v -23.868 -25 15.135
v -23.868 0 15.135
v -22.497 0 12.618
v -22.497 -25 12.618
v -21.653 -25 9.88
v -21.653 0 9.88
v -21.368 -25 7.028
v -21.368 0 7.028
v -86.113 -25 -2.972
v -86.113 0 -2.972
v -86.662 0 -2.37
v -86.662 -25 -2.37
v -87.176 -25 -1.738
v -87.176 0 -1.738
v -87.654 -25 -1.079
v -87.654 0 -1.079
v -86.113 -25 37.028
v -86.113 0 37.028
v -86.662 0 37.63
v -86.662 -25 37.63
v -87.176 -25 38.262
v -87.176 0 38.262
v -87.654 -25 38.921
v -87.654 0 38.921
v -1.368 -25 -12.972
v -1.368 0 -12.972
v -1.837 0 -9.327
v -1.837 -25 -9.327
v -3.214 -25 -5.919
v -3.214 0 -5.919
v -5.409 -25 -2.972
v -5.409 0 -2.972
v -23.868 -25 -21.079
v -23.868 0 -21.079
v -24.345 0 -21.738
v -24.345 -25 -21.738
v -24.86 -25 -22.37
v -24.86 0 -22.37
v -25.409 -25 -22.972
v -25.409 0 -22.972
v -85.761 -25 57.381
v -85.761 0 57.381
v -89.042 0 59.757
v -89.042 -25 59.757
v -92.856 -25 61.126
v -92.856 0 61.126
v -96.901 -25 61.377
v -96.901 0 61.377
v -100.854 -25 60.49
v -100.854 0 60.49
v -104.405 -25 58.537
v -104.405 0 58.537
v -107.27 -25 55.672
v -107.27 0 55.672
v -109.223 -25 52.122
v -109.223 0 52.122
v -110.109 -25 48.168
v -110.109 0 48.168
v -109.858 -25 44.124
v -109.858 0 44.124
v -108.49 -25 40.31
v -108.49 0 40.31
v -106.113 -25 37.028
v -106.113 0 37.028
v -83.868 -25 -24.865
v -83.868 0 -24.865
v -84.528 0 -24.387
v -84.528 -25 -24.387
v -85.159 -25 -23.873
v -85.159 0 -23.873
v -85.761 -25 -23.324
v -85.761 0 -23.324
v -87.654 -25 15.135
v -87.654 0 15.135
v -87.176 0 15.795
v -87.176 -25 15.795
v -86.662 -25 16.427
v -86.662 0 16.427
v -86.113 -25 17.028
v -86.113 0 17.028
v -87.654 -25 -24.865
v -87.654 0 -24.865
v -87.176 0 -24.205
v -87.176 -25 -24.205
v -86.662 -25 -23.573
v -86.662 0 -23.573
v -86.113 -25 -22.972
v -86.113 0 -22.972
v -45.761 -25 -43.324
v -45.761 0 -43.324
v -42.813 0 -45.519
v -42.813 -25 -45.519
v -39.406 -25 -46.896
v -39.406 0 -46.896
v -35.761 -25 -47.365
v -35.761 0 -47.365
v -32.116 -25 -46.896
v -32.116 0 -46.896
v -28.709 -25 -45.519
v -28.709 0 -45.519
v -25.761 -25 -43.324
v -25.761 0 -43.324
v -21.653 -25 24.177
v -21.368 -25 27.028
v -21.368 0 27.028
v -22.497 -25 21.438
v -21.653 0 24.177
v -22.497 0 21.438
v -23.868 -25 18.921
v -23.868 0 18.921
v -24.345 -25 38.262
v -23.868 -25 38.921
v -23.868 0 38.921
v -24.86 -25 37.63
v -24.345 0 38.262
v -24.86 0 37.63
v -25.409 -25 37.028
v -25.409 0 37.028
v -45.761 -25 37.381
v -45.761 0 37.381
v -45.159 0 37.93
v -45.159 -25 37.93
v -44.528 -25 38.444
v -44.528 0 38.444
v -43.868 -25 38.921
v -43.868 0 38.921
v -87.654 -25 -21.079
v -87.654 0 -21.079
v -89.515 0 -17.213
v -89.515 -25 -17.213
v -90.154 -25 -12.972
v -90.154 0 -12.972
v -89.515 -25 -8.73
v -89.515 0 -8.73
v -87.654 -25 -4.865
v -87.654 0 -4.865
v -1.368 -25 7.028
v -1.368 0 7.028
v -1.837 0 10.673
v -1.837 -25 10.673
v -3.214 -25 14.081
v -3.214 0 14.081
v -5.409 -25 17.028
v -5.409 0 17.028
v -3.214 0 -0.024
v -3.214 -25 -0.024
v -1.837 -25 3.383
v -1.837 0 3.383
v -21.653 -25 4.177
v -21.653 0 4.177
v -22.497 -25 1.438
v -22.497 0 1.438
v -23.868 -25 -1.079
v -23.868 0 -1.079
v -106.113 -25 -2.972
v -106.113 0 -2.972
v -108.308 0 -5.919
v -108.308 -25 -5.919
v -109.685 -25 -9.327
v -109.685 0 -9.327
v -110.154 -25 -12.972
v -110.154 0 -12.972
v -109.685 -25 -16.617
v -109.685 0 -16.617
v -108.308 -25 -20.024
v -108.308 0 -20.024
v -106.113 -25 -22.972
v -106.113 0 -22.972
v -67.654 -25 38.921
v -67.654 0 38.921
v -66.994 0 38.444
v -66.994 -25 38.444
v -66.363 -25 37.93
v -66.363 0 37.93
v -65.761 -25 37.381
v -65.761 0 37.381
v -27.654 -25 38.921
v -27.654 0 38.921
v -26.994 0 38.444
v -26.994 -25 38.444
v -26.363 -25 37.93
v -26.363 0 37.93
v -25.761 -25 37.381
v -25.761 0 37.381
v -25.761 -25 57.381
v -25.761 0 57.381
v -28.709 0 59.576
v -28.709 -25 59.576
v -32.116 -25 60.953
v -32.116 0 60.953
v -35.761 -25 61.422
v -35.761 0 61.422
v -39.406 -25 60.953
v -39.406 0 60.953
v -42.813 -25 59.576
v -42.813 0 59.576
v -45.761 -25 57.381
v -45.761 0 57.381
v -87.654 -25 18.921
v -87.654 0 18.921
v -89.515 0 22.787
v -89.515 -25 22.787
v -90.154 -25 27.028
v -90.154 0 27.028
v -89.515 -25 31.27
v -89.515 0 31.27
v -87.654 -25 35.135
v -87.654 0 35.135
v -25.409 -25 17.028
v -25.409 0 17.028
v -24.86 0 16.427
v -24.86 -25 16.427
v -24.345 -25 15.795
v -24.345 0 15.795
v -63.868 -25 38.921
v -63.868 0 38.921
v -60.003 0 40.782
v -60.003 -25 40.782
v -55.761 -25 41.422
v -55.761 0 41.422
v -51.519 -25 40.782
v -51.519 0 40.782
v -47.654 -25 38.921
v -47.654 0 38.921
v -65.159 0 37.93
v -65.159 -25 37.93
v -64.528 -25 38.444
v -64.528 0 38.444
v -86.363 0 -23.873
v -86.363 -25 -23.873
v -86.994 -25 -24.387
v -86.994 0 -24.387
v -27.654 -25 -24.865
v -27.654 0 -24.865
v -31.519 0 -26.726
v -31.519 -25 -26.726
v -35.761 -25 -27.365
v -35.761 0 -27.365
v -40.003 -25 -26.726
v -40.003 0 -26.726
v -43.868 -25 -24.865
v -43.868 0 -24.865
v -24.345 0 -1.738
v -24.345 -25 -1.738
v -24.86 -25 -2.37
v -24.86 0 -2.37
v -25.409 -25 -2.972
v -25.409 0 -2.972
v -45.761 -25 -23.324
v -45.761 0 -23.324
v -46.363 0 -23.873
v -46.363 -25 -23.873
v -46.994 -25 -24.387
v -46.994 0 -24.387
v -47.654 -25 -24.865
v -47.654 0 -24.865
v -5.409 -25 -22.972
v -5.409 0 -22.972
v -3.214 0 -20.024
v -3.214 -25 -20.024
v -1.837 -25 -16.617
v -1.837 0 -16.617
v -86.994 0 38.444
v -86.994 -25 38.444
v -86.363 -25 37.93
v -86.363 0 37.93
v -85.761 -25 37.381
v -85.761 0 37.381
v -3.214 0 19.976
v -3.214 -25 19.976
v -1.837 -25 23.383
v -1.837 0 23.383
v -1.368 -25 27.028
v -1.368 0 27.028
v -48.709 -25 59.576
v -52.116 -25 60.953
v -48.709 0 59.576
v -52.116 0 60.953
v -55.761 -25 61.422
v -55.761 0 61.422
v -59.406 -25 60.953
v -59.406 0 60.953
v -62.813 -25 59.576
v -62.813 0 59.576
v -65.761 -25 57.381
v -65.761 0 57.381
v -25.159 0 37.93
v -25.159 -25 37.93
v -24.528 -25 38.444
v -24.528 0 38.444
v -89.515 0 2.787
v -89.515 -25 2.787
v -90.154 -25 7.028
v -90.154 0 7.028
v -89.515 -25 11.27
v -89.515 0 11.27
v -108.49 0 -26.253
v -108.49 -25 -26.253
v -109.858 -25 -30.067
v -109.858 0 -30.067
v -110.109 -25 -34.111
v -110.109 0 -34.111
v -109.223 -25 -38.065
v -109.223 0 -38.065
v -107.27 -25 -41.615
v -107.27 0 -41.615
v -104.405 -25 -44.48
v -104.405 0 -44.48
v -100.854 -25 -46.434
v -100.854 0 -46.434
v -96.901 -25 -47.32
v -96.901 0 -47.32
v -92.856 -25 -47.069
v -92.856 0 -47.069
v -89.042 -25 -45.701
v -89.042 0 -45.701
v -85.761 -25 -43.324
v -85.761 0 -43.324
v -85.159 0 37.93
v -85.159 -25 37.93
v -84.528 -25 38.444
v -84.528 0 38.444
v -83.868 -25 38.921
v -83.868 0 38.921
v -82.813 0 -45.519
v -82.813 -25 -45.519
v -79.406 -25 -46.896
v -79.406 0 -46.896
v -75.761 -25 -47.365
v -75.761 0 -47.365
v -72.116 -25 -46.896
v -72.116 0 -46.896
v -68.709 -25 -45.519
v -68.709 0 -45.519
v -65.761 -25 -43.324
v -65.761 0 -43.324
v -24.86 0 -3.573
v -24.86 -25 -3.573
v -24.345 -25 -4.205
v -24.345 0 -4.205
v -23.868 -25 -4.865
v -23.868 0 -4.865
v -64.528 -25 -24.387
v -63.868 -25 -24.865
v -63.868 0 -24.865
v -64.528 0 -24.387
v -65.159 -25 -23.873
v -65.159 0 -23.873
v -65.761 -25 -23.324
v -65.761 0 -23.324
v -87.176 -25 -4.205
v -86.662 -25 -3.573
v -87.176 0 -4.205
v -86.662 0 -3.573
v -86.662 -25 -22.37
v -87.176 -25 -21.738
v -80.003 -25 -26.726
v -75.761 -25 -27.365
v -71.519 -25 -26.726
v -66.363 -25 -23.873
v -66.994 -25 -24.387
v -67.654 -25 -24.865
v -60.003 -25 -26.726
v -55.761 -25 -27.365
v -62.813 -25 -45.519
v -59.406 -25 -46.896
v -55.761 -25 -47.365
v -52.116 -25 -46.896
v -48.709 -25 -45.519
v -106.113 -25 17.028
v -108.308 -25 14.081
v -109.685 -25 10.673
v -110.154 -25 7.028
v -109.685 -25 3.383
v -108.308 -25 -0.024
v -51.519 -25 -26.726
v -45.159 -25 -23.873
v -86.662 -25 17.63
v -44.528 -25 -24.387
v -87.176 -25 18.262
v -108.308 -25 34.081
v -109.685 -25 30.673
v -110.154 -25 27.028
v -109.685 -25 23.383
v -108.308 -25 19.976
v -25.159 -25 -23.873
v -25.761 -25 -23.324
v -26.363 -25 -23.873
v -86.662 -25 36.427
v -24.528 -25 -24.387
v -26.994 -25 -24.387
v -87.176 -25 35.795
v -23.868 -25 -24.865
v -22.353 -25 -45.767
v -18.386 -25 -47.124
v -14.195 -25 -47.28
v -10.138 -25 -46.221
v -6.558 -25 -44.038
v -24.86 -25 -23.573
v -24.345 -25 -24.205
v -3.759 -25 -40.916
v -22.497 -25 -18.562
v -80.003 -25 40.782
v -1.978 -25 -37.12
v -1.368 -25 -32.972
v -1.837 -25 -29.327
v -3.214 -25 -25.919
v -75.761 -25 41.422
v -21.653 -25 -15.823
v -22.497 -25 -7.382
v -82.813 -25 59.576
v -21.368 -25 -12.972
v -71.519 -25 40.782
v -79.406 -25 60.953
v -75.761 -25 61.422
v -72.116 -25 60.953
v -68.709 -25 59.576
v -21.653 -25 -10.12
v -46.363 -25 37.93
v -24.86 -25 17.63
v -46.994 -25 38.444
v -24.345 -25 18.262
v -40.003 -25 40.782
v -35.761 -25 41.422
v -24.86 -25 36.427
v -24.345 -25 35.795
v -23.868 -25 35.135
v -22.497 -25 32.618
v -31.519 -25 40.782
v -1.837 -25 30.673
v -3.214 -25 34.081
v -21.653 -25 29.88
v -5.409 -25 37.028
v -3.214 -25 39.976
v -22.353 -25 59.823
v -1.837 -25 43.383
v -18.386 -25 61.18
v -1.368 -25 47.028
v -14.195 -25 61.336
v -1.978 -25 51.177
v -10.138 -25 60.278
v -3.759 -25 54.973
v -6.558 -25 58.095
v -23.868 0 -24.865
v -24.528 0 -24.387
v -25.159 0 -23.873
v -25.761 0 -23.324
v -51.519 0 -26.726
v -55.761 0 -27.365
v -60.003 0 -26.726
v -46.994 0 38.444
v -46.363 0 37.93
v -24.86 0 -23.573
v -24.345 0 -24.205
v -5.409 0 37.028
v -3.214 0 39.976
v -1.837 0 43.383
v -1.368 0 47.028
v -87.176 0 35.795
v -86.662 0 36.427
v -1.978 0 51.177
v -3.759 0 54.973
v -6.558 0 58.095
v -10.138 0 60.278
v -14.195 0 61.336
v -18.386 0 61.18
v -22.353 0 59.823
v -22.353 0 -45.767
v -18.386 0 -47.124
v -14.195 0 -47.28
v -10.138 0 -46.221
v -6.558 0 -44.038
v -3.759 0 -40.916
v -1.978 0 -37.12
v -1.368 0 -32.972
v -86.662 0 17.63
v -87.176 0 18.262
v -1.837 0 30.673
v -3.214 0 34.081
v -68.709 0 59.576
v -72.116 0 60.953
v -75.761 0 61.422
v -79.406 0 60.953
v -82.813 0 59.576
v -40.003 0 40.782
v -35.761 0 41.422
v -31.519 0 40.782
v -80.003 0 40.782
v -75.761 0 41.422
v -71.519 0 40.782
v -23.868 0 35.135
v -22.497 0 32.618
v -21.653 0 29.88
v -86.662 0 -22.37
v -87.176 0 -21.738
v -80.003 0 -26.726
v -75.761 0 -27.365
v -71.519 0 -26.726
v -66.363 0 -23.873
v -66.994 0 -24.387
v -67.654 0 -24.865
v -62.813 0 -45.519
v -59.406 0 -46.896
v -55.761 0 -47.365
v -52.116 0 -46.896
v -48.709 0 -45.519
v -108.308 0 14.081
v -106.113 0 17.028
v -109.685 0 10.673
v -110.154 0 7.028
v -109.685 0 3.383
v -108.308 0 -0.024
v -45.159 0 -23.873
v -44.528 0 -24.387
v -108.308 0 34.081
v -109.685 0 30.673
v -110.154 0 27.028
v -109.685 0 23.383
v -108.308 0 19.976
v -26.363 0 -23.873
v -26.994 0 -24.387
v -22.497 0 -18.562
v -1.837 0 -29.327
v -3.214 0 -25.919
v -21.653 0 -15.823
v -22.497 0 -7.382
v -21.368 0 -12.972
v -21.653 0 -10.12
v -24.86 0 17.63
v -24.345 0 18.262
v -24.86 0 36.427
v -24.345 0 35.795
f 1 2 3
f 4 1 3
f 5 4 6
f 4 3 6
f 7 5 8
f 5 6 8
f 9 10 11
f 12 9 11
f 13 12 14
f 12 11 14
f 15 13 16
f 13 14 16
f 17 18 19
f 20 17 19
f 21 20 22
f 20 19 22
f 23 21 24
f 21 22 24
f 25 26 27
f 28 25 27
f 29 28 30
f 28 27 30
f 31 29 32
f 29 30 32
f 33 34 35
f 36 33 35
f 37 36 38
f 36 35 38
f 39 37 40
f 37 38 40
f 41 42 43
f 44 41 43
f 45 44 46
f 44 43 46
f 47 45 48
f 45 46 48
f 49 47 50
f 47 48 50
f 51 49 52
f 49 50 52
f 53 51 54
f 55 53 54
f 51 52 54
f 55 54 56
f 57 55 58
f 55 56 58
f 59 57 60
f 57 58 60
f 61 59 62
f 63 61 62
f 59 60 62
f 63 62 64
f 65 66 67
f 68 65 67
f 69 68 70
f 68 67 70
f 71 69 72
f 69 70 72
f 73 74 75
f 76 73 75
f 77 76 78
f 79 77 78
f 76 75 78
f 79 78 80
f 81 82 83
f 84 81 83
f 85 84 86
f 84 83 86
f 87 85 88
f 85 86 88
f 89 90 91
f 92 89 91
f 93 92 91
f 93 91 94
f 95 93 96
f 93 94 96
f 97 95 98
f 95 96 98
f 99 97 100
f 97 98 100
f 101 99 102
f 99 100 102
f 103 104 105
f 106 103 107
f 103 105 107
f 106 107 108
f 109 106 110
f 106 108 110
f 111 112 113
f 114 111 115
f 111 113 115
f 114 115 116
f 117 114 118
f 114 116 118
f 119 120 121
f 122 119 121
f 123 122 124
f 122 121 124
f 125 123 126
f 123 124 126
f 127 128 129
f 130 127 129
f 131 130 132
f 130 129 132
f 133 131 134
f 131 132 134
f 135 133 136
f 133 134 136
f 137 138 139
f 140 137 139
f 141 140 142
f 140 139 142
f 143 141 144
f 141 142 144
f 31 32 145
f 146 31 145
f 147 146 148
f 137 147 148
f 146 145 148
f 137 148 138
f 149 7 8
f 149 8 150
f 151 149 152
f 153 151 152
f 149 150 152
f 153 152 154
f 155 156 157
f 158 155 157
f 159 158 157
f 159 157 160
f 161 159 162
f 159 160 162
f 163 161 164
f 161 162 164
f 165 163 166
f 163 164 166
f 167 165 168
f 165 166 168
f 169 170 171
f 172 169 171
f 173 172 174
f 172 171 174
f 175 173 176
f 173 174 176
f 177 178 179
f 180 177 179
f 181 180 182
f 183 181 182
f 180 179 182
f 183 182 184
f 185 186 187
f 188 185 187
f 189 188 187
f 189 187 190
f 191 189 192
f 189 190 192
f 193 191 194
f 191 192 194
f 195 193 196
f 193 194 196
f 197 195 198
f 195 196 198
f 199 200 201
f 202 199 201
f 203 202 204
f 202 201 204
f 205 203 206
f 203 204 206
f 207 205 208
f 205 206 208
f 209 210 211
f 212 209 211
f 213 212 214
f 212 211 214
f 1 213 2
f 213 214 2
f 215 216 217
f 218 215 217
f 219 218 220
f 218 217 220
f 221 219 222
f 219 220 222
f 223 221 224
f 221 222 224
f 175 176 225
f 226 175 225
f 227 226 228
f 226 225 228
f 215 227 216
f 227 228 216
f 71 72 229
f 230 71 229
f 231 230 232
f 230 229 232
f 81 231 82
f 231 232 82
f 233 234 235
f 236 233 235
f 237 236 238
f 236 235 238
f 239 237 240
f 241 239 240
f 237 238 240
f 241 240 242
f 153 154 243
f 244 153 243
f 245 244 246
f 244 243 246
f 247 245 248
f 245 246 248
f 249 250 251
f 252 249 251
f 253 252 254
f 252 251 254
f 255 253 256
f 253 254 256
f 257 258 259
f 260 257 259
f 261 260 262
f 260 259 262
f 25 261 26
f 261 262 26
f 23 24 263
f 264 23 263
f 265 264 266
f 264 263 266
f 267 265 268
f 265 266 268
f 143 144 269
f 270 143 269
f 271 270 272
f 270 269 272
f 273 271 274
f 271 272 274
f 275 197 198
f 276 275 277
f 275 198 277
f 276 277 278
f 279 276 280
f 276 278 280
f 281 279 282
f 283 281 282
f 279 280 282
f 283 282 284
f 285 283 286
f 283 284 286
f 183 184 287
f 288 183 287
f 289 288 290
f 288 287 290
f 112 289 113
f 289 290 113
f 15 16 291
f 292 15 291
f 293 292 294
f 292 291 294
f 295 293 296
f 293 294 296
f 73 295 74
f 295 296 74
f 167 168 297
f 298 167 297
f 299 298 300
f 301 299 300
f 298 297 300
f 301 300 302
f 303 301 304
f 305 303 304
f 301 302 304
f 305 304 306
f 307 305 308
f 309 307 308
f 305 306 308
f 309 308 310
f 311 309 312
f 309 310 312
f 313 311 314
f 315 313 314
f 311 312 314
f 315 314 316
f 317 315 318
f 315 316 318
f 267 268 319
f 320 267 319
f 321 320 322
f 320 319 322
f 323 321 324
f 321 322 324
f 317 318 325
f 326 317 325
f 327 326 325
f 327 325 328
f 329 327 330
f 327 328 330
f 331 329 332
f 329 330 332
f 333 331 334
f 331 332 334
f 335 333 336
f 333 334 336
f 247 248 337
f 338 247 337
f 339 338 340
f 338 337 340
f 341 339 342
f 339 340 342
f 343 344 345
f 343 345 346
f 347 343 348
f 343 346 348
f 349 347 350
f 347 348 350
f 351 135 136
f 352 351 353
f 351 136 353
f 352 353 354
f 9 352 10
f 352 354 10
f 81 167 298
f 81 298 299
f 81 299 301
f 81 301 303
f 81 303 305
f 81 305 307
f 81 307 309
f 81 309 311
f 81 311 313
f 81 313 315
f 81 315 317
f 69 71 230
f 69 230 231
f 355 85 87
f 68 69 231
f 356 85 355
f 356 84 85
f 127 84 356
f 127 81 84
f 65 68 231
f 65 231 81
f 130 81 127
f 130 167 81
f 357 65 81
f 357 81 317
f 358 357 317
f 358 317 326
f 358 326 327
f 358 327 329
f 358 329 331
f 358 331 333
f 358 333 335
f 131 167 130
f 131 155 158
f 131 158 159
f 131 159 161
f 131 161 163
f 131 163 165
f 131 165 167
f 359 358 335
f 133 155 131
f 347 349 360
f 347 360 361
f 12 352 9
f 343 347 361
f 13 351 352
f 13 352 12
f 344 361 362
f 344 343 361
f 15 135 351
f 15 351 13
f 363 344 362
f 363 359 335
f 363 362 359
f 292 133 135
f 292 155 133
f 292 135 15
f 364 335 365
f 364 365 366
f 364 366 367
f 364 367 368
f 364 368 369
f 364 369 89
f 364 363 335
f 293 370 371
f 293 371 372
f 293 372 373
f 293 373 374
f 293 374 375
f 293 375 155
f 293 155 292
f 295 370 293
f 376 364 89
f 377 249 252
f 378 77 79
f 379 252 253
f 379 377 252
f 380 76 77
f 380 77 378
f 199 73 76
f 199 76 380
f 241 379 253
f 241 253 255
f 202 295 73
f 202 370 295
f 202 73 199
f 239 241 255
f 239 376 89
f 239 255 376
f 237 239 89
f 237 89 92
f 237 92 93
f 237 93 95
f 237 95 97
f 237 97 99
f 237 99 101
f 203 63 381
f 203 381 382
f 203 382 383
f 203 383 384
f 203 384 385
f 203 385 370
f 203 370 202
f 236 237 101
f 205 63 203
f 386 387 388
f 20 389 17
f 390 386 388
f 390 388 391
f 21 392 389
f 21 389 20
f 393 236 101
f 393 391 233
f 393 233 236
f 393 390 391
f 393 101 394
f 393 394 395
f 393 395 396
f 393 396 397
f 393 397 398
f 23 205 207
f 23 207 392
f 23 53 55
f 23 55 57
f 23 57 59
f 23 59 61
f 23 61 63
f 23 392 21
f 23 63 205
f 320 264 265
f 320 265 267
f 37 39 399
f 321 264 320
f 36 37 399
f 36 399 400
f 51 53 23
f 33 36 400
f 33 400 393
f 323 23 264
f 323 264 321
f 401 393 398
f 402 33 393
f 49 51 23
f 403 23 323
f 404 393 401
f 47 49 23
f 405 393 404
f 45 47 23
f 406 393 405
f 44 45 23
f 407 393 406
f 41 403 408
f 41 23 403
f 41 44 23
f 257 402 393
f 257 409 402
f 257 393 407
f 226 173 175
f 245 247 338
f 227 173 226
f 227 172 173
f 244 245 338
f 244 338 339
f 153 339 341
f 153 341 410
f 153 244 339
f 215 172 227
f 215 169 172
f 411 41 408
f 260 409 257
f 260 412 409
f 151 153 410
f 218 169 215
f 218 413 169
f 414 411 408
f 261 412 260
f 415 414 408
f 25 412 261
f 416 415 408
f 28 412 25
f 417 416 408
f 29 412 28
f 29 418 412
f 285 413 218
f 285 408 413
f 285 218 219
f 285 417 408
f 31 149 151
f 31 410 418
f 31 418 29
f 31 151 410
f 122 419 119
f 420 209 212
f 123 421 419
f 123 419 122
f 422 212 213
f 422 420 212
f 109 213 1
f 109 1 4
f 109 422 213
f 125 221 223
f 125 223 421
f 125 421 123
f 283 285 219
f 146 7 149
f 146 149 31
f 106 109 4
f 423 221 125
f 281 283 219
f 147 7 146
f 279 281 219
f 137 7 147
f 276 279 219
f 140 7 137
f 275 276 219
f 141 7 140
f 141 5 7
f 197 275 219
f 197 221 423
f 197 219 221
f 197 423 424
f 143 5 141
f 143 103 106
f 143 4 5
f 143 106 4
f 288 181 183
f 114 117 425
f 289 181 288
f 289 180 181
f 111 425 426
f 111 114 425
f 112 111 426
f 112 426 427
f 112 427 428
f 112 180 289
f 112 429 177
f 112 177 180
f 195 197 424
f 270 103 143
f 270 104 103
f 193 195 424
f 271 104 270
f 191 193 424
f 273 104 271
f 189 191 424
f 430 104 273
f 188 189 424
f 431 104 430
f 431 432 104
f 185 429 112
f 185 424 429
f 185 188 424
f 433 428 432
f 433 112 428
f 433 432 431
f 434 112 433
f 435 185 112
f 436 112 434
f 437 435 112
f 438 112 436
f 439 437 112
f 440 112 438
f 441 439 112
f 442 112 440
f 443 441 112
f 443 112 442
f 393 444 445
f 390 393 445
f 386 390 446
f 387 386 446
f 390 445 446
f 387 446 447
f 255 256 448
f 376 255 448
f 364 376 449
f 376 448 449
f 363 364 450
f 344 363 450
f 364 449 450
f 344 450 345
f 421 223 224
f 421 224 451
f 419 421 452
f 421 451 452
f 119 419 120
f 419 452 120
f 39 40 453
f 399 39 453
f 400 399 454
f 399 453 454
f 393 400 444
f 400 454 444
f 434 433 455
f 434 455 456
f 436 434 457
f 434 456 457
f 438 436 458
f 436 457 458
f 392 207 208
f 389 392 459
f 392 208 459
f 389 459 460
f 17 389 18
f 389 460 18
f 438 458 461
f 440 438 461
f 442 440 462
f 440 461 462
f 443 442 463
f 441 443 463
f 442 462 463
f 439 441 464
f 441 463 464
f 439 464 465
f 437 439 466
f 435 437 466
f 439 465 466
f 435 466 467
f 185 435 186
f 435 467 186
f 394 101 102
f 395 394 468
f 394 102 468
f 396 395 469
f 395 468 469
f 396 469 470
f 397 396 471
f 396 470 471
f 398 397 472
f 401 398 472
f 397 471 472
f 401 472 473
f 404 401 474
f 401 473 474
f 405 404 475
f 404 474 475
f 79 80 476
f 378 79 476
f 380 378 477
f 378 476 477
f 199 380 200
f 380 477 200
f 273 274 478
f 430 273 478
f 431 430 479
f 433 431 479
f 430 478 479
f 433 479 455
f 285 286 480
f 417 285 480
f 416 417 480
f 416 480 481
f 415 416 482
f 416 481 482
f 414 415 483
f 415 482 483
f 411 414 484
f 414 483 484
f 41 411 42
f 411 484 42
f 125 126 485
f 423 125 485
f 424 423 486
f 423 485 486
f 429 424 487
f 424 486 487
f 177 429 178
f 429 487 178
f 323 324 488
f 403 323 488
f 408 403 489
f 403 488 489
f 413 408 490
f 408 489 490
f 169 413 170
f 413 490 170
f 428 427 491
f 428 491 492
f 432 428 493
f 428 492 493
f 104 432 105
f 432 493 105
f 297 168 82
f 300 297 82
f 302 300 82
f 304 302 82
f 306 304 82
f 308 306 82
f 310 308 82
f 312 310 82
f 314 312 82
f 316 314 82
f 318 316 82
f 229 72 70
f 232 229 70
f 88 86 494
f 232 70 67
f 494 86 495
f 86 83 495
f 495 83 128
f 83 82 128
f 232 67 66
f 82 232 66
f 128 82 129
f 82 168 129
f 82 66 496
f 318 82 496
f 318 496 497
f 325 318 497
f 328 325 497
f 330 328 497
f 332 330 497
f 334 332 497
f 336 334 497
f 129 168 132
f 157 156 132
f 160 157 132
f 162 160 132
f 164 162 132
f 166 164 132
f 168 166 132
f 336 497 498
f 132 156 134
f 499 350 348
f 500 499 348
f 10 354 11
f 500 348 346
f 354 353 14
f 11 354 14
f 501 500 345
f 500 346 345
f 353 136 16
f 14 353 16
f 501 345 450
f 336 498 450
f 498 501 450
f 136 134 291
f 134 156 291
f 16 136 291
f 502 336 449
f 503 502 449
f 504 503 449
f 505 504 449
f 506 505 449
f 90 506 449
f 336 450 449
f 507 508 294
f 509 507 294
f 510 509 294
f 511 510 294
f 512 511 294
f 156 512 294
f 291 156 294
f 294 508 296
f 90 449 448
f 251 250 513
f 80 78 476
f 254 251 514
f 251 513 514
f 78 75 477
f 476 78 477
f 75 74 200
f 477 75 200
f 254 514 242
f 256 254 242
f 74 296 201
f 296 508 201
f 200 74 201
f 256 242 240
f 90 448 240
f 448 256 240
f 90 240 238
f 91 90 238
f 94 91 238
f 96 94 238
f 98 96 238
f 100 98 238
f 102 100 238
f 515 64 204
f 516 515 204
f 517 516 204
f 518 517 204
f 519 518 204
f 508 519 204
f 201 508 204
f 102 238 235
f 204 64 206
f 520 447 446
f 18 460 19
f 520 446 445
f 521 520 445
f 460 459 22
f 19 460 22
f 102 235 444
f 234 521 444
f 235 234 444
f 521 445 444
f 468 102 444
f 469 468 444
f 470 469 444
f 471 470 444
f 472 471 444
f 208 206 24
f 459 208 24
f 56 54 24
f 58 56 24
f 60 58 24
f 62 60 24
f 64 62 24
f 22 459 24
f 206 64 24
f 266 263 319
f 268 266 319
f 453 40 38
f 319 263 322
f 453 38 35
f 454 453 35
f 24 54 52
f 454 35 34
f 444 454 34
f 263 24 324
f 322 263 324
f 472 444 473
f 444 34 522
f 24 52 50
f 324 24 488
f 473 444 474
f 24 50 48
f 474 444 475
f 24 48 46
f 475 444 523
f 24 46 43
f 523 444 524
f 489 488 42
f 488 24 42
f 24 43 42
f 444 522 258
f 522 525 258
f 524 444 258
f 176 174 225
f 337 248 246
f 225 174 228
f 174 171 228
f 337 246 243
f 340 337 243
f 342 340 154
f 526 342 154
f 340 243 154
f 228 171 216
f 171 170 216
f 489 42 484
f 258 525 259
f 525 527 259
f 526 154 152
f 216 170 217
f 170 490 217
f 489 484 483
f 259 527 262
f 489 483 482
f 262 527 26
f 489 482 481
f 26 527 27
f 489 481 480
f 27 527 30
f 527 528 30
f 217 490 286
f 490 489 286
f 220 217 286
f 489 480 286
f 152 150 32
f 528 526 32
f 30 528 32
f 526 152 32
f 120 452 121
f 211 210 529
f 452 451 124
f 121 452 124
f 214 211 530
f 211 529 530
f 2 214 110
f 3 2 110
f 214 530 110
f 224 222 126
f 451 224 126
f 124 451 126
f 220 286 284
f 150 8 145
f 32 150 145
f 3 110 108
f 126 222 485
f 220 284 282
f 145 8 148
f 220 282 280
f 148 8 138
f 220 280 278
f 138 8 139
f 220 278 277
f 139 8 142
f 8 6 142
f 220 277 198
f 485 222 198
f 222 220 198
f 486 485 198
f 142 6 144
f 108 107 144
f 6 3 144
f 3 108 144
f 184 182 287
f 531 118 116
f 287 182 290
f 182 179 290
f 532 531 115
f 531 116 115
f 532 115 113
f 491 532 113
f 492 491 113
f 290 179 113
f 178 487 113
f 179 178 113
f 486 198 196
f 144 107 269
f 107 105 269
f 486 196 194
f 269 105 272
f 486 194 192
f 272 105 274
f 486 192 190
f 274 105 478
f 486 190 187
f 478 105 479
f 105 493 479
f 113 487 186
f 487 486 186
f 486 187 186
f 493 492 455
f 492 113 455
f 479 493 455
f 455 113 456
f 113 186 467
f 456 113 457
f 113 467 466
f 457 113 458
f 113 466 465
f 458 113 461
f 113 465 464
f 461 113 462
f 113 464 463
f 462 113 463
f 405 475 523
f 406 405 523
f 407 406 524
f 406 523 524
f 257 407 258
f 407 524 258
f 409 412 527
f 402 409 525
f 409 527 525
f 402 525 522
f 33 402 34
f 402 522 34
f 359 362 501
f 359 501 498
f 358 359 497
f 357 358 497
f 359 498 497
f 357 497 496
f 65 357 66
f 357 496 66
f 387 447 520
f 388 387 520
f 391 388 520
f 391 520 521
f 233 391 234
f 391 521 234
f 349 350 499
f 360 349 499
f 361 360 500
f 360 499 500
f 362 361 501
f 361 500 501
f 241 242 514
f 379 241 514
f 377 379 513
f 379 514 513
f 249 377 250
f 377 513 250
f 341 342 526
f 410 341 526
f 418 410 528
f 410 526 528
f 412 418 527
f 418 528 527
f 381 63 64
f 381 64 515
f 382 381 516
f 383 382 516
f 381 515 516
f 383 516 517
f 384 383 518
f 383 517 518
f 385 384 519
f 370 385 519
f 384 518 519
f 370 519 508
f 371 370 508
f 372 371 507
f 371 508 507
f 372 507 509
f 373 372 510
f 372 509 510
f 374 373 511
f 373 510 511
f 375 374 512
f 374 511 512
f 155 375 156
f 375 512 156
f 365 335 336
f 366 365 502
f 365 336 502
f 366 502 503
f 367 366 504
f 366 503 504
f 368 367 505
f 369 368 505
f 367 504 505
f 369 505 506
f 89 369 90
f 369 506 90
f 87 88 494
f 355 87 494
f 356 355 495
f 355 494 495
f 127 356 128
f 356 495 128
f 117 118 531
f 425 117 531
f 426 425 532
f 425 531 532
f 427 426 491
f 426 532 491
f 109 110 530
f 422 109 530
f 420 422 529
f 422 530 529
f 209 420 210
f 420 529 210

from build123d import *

# Parameters (mm, degrees)
F1_DEPTH = 25


with BuildPart() as f1:
    # F0 (on Front) → F1 (new body)
    with BuildSketch(Plane.XZ):
        with BuildLine():
            ThreePointArc((-85.7609340549, -43.3237808544), (-82.5113908499, -38.594520506), (-81.3676158684, -32.9716019332))
            ThreePointArc((-81.3676158684, -32.9716019332), (-82.0068675294, -28.7297553509), (-83.8678402358, -24.8646957523))
            ThreePointArc((-83.8678402358, -24.8646957523), (-84.8471113337, -24.1344416649), (-85.7609340549, -23.3237808544))
            ThreePointArc((-85.7609340549, -23.3237808544), (-86.674756776, -24.1344416649), (-87.6540278739, -24.8646957523))
            ThreePointArc((-87.6540278739, -24.8646957523), (-90.0791512953, -34.4400240359), (-85.7609340549, -43.3237808544))
        make_face()
        with BuildLine():
            ThreePointArc((-83.8678402358, -24.8646957523), (-82.0068675294, -28.7297553509), (-81.3676158684, -32.9716019332))
            ThreePointArc((-81.3676158684, -32.9716019332), (-82.5113908499, -38.594520506), (-85.7609340549, -43.3237808544))
            ThreePointArc((-85.7609340549, -43.3237808544), (-75.7609340549, -47.3649201197), (-65.7609340549, -43.3237808544))
            ThreePointArc((-65.7609340549, -43.3237808544), (-70.0791512953, -34.4400240359), (-67.6540278739, -24.8646957523))
            ThreePointArc((-67.6540278739, -24.8646957523), (-75.7609340549, -27.3649201197), (-83.8678402358, -24.8646957523))
        make_face()
        with BuildLine():
            ThreePointArc((-106.113112976, -22.9716019332), (-105.9385469482, -43.1492148266), (-85.7609340549, -43.3237808544))
            ThreePointArc((-85.7609340549, -43.3237808544), (-90.0791512953, -34.4400240359), (-87.6540278739, -24.8646957523))
            ThreePointArc((-87.6540278739, -24.8646957523), (-97.2293561575, -27.2898191737), (-106.113112976, -22.9716019332))
        make_face()
        with BuildLine():
            ThreePointArc((-65.7609340549, -23.3237808544), (-66.674756776, -24.1344416649), (-67.6540278739, -24.8646957523))
            ThreePointArc((-67.6540278739, -24.8646957523), (-70.0791512953, -34.4400240359), (-65.7609340549, -43.3237808544))
            ThreePointArc((-65.7609340549, -43.3237808544), (-62.5113908499, -38.594520506), (-61.3676158684, -32.9716019332))
            ThreePointArc((-61.3676158684, -32.9716019332), (-62.0068675294, -28.7297553509), (-63.8678402358, -24.8646957523))
            ThreePointArc((-63.8678402358, -24.8646957523), (-64.8471113337, -24.1344416649), (-65.7609340549, -23.3237808544))
        make_face()
        with BuildLine():
            ThreePointArc((-106.113112976, -2.9716019332), (-110.1542522413, -12.9716019332), (-106.113112976, -22.9716019332))
            ThreePointArc((-106.113112976, -22.9716019332), (-97.2293561575, -18.6533846928), (-87.6540278739, -21.0785081142))
            ThreePointArc((-87.6540278739, -21.0785081142), (-90.1542522413, -12.9716019332), (-87.6540278739, -4.8646957523))
            ThreePointArc((-87.6540278739, -4.8646957523), (-97.2293561575, -7.2898191737), (-106.113112976, -2.9716019332))
        make_face()
        with BuildLine():
            ThreePointArc((-87.6540278739, -21.0785081142), (-97.2293561575, -18.6533846928), (-106.113112976, -22.9716019332))
            ThreePointArc((-106.113112976, -22.9716019332), (-97.2293561575, -27.2898191737), (-87.6540278739, -24.8646957523))
            ThreePointArc((-87.6540278739, -24.8646957523), (-86.9237737865, -23.8854246544), (-86.113112976, -22.9716019332))
            ThreePointArc((-86.113112976, -22.9716019332), (-86.9237737865, -22.057779212), (-87.6540278739, -21.0785081142))
        make_face()
        with BuildLine():
            ThreePointArc((-61.3676158684, -32.9716019332), (-62.5113908499, -38.594520506), (-65.7609340549, -43.3237808544))
            ThreePointArc((-65.7609340549, -43.3237808544), (-55.7609340549, -47.3649201197), (-45.7609340549, -43.3237808544))
            ThreePointArc((-45.7609340549, -43.3237808544), (-50.0791512953, -34.4400240359), (-47.6540278739, -24.8646957523))
            ThreePointArc((-47.6540278739, -24.8646957523), (-55.7609340549, -27.3649201197), (-63.8678402358, -24.8646957523))
            ThreePointArc((-63.8678402358, -24.8646957523), (-62.0068675294, -28.7297553509), (-61.3676158684, -32.9716019332))
        make_face()
        with BuildLine():
            ThreePointArc((-106.113112976, 17.0283980668), (-110.1542522413, 7.0283980668), (-106.113112976, -2.9716019332))
            ThreePointArc((-106.113112976, -2.9716019332), (-97.2293561575, 1.3466153072), (-87.6540278739, -1.0785081142))
            ThreePointArc((-87.6540278739, -1.0785081142), (-90.1542522413, 7.0283980668), (-87.6540278739, 15.1353042477))
            ThreePointArc((-87.6540278739, 15.1353042477), (-97.2293561575, 12.7101808263), (-106.113112976, 17.0283980668))
        make_face()
        with BuildLine():
            ThreePointArc((-87.6540278739, -1.0785081142), (-97.2293561575, 1.3466153072), (-106.113112976, -2.9716019332))
            ThreePointArc((-106.113112976, -2.9716019332), (-97.2293561575, -7.2898191737), (-87.6540278739, -4.8646957523))
            ThreePointArc((-87.6540278739, -4.8646957523), (-86.9237737865, -3.8854246544), (-86.113112976, -2.9716019332))
            ThreePointArc((-86.113112976, -2.9716019332), (-86.9237737865, -2.057779212), (-87.6540278739, -1.0785081142))
        make_face()
        with BuildLine():
            ThreePointArc((-47.6540278739, -24.8646957523), (-50.0791512953, -34.4400240359), (-45.7609340549, -43.3237808544))
            ThreePointArc((-45.7609340549, -43.3237808544), (-42.5113908499, -38.594520506), (-41.3676158684, -32.9716019332))
            ThreePointArc((-41.3676158684, -32.9716019332), (-42.0068675294, -28.7297553509), (-43.8678402358, -24.8646957523))
            ThreePointArc((-43.8678402358, -24.8646957523), (-44.8471113337, -24.1344416649), (-45.7609340549, -23.3237808544))
            ThreePointArc((-45.7609340549, -23.3237808544), (-46.674756776, -24.1344416649), (-47.6540278739, -24.8646957523))
        make_face()
        with BuildLine():
            ThreePointArc((-41.3676158684, -32.9716019332), (-42.5113908499, -38.594520506), (-45.7609340549, -43.3237808544))
            ThreePointArc((-45.7609340549, -43.3237808544), (-35.7609340549, -47.3649201197), (-25.7609340549, -43.3237808544))
            ThreePointArc((-25.7609340549, -43.3237808544), (-30.0791512953, -34.4400240359), (-27.6540278739, -24.8646957523))
            ThreePointArc((-27.6540278739, -24.8646957523), (-35.7609340549, -27.3649201197), (-43.8678402358, -24.8646957523))
            ThreePointArc((-43.8678402358, -24.8646957523), (-42.0068675294, -28.7297553509), (-41.3676158684, -32.9716019332))
        make_face()
        with BuildLine():
            ThreePointArc((-106.113112976, 37.0283980668), (-110.1542522413, 27.0283980668), (-106.113112976, 17.0283980668))
            ThreePointArc((-106.113112976, 17.0283980668), (-97.2293561575, 21.3466153072), (-87.6540278739, 18.9214918858))
            ThreePointArc((-87.6540278739, 18.9214918858), (-90.1542522413, 27.0283980668), (-87.6540278739, 35.1353042477))
            ThreePointArc((-87.6540278739, 35.1353042477), (-97.2293561575, 32.7101808263), (-106.113112976, 37.0283980668))
        make_face()
        with BuildLine():
            ThreePointArc((-87.6540278739, 18.9214918858), (-97.2293561575, 21.3466153072), (-106.113112976, 17.0283980668))
            ThreePointArc((-106.113112976, 17.0283980668), (-97.2293561575, 12.7101808263), (-87.6540278739, 15.1353042477))
            ThreePointArc((-87.6540278739, 15.1353042477), (-86.9237737865, 16.1145753456), (-86.113112976, 17.0283980668))
            ThreePointArc((-86.113112976, 17.0283980668), (-86.9237737865, 17.942220788), (-87.6540278739, 18.9214918858))
        make_face()
        with BuildLine():
            ThreePointArc((-27.6540278739, -24.8646957523), (-30.0791512953, -34.4400240359), (-25.7609340549, -43.3237808544))
            ThreePointArc((-25.7609340549, -43.3237808544), (-22.5113908499, -38.594520506), (-21.3676158684, -32.9716019332))
            ThreePointArc((-21.3676158684, -32.9716019332), (-22.0068675294, -28.7297553509), (-23.8678402358, -24.8646957523))
            ThreePointArc((-23.8678402358, -24.8646957523), (-24.8471113337, -24.1344416649), (-25.7609340549, -23.3237808544))
            ThreePointArc((-25.7609340549, -23.3237808544), (-26.674756776, -24.1344416649), (-27.6540278739, -24.8646957523))
        make_face()
        with BuildLine():
            ThreePointArc((-21.3676158684, -32.9716019332), (-22.5113908499, -38.594520506), (-25.7609340549, -43.3237808544))
            ThreePointArc((-25.7609340549, -43.3237808544), (-10.1380154821, -46.2211451382), (-1.3676158684, -32.9716019332))
            ThreePointArc((-1.3676158684, -32.9716019332), (-2.4160883542, -27.5787639382), (-5.4087551337, -22.9716019332))
            ThreePointArc((-5.4087551337, -22.9716019332), (-14.2925119522, -27.2898191737), (-23.8678402358, -24.8646957523))
            ThreePointArc((-23.8678402358, -24.8646957523), (-22.0068675294, -28.7297553509), (-21.3676158684, -32.9716019332))
        make_face()
        with BuildLine():
            ThreePointArc((-85.7609340549, 57.3805769879), (-105.9385469482, 57.2060109602), (-106.113112976, 37.0283980668))
            ThreePointArc((-106.113112976, 37.0283980668), (-97.2293561575, 41.3466153072), (-87.6540278739, 38.9214918858))
            ThreePointArc((-87.6540278739, 38.9214918858), (-90.0791512953, 48.4968201694), (-85.7609340549, 57.3805769879))
        make_face()
        with BuildLine():
            ThreePointArc((-87.6540278739, 38.9214918858), (-97.2293561575, 41.3466153072), (-106.113112976, 37.0283980668))
            ThreePointArc((-106.113112976, 37.0283980668), (-97.2293561575, 32.7101808263), (-87.6540278739, 35.1353042477))
            ThreePointArc((-87.6540278739, 35.1353042477), (-86.9237737865, 36.1145753456), (-86.113112976, 37.0283980668))
            ThreePointArc((-86.113112976, 37.0283980668), (-86.9237737865, 37.942220788), (-87.6540278739, 38.9214918858))
        make_face()
        with BuildLine():
            ThreePointArc((-85.7609340549, 57.3805769879), (-90.0791512953, 48.4968201694), (-87.6540278739, 38.9214918858))
            ThreePointArc((-87.6540278739, 38.9214918858), (-86.674756776, 38.1912377984), (-85.7609340549, 37.3805769879))
            ThreePointArc((-85.7609340549, 37.3805769879), (-84.8471113337, 38.1912377984), (-83.8678402358, 38.9214918858))
            ThreePointArc((-83.8678402358, 38.9214918858), (-82.0068675294, 42.7865514844), (-81.3676158684, 47.0283980668))
            ThreePointArc((-81.3676158684, 47.0283980668), (-82.5113908499, 52.6513166395), (-85.7609340549, 57.3805769879))
        make_face()
        with BuildLine():
            ThreePointArc((-65.7609340549, 57.3805769879), (-75.7609340549, 61.4217162532), (-85.7609340549, 57.3805769879))
            ThreePointArc((-85.7609340549, 57.3805769879), (-82.5113908499, 52.6513166395), (-81.3676158684, 47.0283980668))
            ThreePointArc((-81.3676158684, 47.0283980668), (-82.0068675294, 42.7865514844), (-83.8678402358, 38.9214918858))
            ThreePointArc((-83.8678402358, 38.9214918858), (-75.7609340549, 41.4217162532), (-67.6540278739, 38.9214918858))
            ThreePointArc((-67.6540278739, 38.9214918858), (-70.0791512953, 48.4968201694), (-65.7609340549, 57.3805769879))
        make_face()
        with BuildLine():
            ThreePointArc((-25.4087551337, -22.9716019332), (-24.5980943232, -23.8854246544), (-23.8678402358, -24.8646957523))
            ThreePointArc((-23.8678402358, -24.8646957523), (-14.2925119522, -27.2898191737), (-5.4087551337, -22.9716019332))
            ThreePointArc((-5.4087551337, -22.9716019332), (-14.2925119522, -18.6533846928), (-23.8678402358, -21.0785081142))
            ThreePointArc((-23.8678402358, -21.0785081142), (-24.5980943232, -22.057779212), (-25.4087551337, -22.9716019332))
        make_face()
        with BuildLine():
            ThreePointArc((-23.8678402358, -21.0785081142), (-14.2925119522, -18.6533846928), (-5.4087551337, -22.9716019332))
            ThreePointArc((-5.4087551337, -22.9716019332), (-2.4160883542, -18.3644399282), (-1.3676158684, -12.9716019332))
            ThreePointArc((-1.3676158684, -12.9716019332), (-2.4160883542, -7.5787639382), (-5.4087551337, -2.9716019332))
            ThreePointArc((-5.4087551337, -2.9716019332), (-14.2925119522, -7.2898191737), (-23.8678402358, -4.8646957523))
            ThreePointArc((-23.8678402358, -4.8646957523), (-22.0068675294, -8.7297553509), (-21.3676158684, -12.9716019332))
            ThreePointArc((-21.3676158684, -12.9716019332), (-22.0068675294, -17.2134485156), (-23.8678402358, -21.0785081142))
        make_face()
        with BuildLine():
            ThreePointArc((-45.7609340549, 57.3805769879), (-55.7609340549, 61.4217162532), (-65.7609340549, 57.3805769879))
            ThreePointArc((-65.7609340549, 57.3805769879), (-62.5113908499, 52.6513166395), (-61.3676158684, 47.0283980668))
            ThreePointArc((-61.3676158684, 47.0283980668), (-62.0068675294, 42.7865514844), (-63.8678402358, 38.9214918858))
            ThreePointArc((-63.8678402358, 38.9214918858), (-55.7609340549, 41.4217162532), (-47.6540278739, 38.9214918858))
            ThreePointArc((-47.6540278739, 38.9214918858), (-50.0791512953, 48.4968201694), (-45.7609340549, 57.3805769879))
        make_face()
        with BuildLine():
            ThreePointArc((-61.3676158684, 47.0283980668), (-62.5113908499, 52.6513166395), (-65.7609340549, 57.3805769879))
            ThreePointArc((-65.7609340549, 57.3805769879), (-70.0791512953, 48.4968201694), (-67.6540278739, 38.9214918858))
            ThreePointArc((-67.6540278739, 38.9214918858), (-66.674756776, 38.1912377984), (-65.7609340549, 37.3805769879))
            ThreePointArc((-65.7609340549, 37.3805769879), (-64.8471113337, 38.1912377984), (-63.8678402358, 38.9214918858))
            ThreePointArc((-63.8678402358, 38.9214918858), (-62.0068675294, 42.7865514844), (-61.3676158684, 47.0283980668))
        make_face()
        with BuildLine():
            ThreePointArc((-25.7609340549, 57.3805769879), (-35.7609340549, 61.4217162532), (-45.7609340549, 57.3805769879))
            ThreePointArc((-45.7609340549, 57.3805769879), (-42.5113908499, 52.6513166395), (-41.3676158684, 47.0283980668))
            ThreePointArc((-41.3676158684, 47.0283980668), (-42.0068675294, 42.7865514844), (-43.8678402358, 38.9214918858))
            ThreePointArc((-43.8678402358, 38.9214918858), (-35.7609340549, 41.4217162532), (-27.6540278739, 38.9214918858))
            ThreePointArc((-27.6540278739, 38.9214918858), (-30.0791512953, 48.4968201694), (-25.7609340549, 57.3805769879))
        make_face()
        with BuildLine():
            ThreePointArc((-41.3676158684, 47.0283980668), (-42.5113908499, 52.6513166395), (-45.7609340549, 57.3805769879))
            ThreePointArc((-45.7609340549, 57.3805769879), (-50.0791512953, 48.4968201694), (-47.6540278739, 38.9214918858))
            ThreePointArc((-47.6540278739, 38.9214918858), (-46.674756776, 38.1912377984), (-45.7609340549, 37.3805769879))
            ThreePointArc((-45.7609340549, 37.3805769879), (-44.8471113337, 38.1912377984), (-43.8678402358, 38.9214918858))
            ThreePointArc((-43.8678402358, 38.9214918858), (-42.0068675294, 42.7865514844), (-41.3676158684, 47.0283980668))
        make_face()
        with BuildLine():
            ThreePointArc((-23.8678402358, -4.8646957523), (-14.2925119522, -7.2898191737), (-5.4087551337, -2.9716019332))
            ThreePointArc((-5.4087551337, -2.9716019332), (-14.2925119522, 1.3466153072), (-23.8678402358, -1.0785081142))
            ThreePointArc((-23.8678402358, -1.0785081142), (-24.5980943232, -2.057779212), (-25.4087551337, -2.9716019332))
            ThreePointArc((-25.4087551337, -2.9716019332), (-24.5980943232, -3.8854246544), (-23.8678402358, -4.8646957523))
        make_face()
        with BuildLine():
            ThreePointArc((-23.8678402358, -1.0785081142), (-14.2925119522, 1.3466153072), (-5.4087551337, -2.9716019332))
            ThreePointArc((-5.4087551337, -2.9716019332), (-2.4160883542, 1.6355600718), (-1.3676158684, 7.0283980668))
            ThreePointArc((-1.3676158684, 7.0283980668), (-2.4160883542, 12.4212360618), (-5.4087551337, 17.0283980668))
            ThreePointArc((-5.4087551337, 17.0283980668), (-14.2925119522, 12.7101808263), (-23.8678402358, 15.1353042477))
            ThreePointArc((-23.8678402358, 15.1353042477), (-22.0068675294, 11.2702446491), (-21.3676158684, 7.0283980668))
            ThreePointArc((-21.3676158684, 7.0283980668), (-22.0068675294, 2.7865514844), (-23.8678402358, -1.0785081142))
        make_face()
        with BuildLine():
            ThreePointArc((-1.3676158684, 47.0283980668), (-10.1380154821, 60.2779412717), (-25.7609340549, 57.3805769879))
            ThreePointArc((-25.7609340549, 57.3805769879), (-22.5113908499, 52.6513166395), (-21.3676158684, 47.0283980668))
            ThreePointArc((-21.3676158684, 47.0283980668), (-22.0068675294, 42.7865514844), (-23.8678402358, 38.9214918858))
            ThreePointArc((-23.8678402358, 38.9214918858), (-14.2925119522, 41.3466153072), (-5.4087551337, 37.0283980668))
            ThreePointArc((-5.4087551337, 37.0283980668), (-2.4160883542, 41.6355600718), (-1.3676158684, 47.0283980668))
        make_face()
        with BuildLine():
            ThreePointArc((-21.3676158684, 47.0283980668), (-22.5113908499, 52.6513166395), (-25.7609340549, 57.3805769879))
            ThreePointArc((-25.7609340549, 57.3805769879), (-30.0791512953, 48.4968201694), (-27.6540278739, 38.9214918858))
            ThreePointArc((-27.6540278739, 38.9214918858), (-26.674756776, 38.1912377984), (-25.7609340549, 37.3805769879))
            ThreePointArc((-25.7609340549, 37.3805769879), (-24.8471113337, 38.1912377984), (-23.8678402358, 38.9214918858))
            ThreePointArc((-23.8678402358, 38.9214918858), (-22.0068675294, 42.7865514844), (-21.3676158684, 47.0283980668))
        make_face()
        with BuildLine():
            ThreePointArc((-23.8678402358, 15.1353042477), (-14.2925119522, 12.7101808263), (-5.4087551337, 17.0283980668))
            ThreePointArc((-5.4087551337, 17.0283980668), (-14.2925119522, 21.3466153072), (-23.8678402358, 18.9214918858))
            ThreePointArc((-23.8678402358, 18.9214918858), (-24.5980943232, 17.942220788), (-25.4087551337, 17.0283980668))
            ThreePointArc((-25.4087551337, 17.0283980668), (-24.5980943232, 16.1145753456), (-23.8678402358, 15.1353042477))
        make_face()
        with BuildLine():
            ThreePointArc((-23.8678402358, 18.9214918858), (-14.2925119522, 21.3466153072), (-5.4087551337, 17.0283980668))
            ThreePointArc((-5.4087551337, 17.0283980668), (-2.4160883542, 21.6355600718), (-1.3676158684, 27.0283980668))
            ThreePointArc((-1.3676158684, 27.0283980668), (-2.4160883542, 32.4212360618), (-5.4087551337, 37.0283980668))
            ThreePointArc((-5.4087551337, 37.0283980668), (-14.2925119522, 32.7101808263), (-23.8678402358, 35.1353042477))
            ThreePointArc((-23.8678402358, 35.1353042477), (-22.0068675294, 31.2702446491), (-21.3676158684, 27.0283980668))
            ThreePointArc((-21.3676158684, 27.0283980668), (-22.0068675294, 22.7865514844), (-23.8678402358, 18.9214918858))
        make_face()
        with BuildLine():
            ThreePointArc((-5.4087551337, 37.0283980668), (-14.2925119522, 41.3466153072), (-23.8678402358, 38.9214918858))
            ThreePointArc((-23.8678402358, 38.9214918858), (-24.5980943232, 37.942220788), (-25.4087551337, 37.0283980668))
            ThreePointArc((-25.4087551337, 37.0283980668), (-24.5980943232, 36.1145753456), (-23.8678402358, 35.1353042477))
            ThreePointArc((-23.8678402358, 35.1353042477), (-14.2925119522, 32.7101808263), (-5.4087551337, 37.0283980668))
        make_face()
    extrude(amount=F1_DEPTH)


solid = f1.part
